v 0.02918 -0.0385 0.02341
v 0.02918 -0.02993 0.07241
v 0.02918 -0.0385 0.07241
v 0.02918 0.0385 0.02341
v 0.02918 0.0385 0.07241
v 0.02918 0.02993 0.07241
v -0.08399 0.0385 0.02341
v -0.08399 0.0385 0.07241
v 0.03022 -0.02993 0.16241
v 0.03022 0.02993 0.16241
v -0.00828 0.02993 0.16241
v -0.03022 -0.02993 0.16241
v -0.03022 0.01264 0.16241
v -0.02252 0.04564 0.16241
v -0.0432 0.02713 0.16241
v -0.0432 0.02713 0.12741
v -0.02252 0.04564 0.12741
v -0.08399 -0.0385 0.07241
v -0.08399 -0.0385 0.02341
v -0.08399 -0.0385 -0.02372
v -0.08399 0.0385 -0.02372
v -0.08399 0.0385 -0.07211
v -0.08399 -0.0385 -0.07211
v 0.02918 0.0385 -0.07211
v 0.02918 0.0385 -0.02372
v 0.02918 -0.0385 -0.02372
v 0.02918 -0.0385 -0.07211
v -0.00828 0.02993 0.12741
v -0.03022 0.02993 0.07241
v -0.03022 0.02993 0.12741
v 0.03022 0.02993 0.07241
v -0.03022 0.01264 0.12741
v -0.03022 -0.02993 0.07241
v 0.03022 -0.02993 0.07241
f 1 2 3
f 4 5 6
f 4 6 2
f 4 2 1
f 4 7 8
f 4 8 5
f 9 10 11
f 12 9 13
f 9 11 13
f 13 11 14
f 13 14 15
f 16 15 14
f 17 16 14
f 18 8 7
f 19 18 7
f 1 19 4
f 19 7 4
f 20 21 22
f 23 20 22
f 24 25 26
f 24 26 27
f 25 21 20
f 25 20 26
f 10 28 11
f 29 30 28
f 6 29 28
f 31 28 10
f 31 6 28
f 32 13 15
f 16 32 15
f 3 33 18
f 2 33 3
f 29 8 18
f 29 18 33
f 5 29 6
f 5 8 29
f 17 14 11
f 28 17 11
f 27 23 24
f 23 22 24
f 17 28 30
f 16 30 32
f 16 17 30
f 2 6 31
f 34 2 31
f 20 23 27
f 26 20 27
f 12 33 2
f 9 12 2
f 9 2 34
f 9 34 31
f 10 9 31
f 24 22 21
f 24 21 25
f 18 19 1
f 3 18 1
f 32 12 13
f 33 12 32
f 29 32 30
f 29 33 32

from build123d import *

# Parameters (mm, degrees)
SKETCH1_W             = 0.113177451
SKETCH1_H             = 0.048392057
BOSS_EXTRUDE1_DEPTH   = 0.0385
SKETCH1_H_2           = 0.04900298
BOSS_EXTRUDE1_2_DEPTH = 0.0385
SKETCH2_W             = 0.060435072
SKETCH2_H             = 0.059857316
BOSS_EXTRUDE2_DEPTH   = 0.09
BOSS_EXTRUDE3_DEPTH   = 0.035


with BuildPart() as part:
    # Sketch1 → Boss-Extrude1 (new body, symmetric)
    with BuildSketch(Plane(origin=(0, 0, 0), x_dir=(1, 0, 0), z_dir=(0, 1, 0))):
        with Locations((-0.027404412, 0.047911973)):
            Rectangle(SKETCH1_W, SKETCH1_H)
    extrude(amount=BOSS_EXTRUDE1_DEPTH, both=True)


with BuildPart() as body_2:
    # Sketch1 → Boss-Extrude1 2 (new body, symmetric)
    with BuildSketch(Plane(origin=(0, 0, 0), x_dir=(1, 0, 0), z_dir=(0, 1, 0))):
        with Locations((-0.027404412, -0.047911817)):
            Rectangle(SKETCH1_W, SKETCH1_H_2)
    extrude(amount=BOSS_EXTRUDE1_2_DEPTH, both=True)

    # Sketch2 → Boss-Extrude2 (add)
    with BuildSketch(Plane.XY.offset(0.072413307)):
        Rectangle(SKETCH2_W, SKETCH2_H)
    extrude(amount=BOSS_EXTRUDE2_DEPTH)

    # Sketch3 → Boss-Extrude3 (add)
    with BuildSketch(Plane.XY.offset(0.162413307)):
        Polygon((-0.030217536, 0.012636531), (-0.043195458, 0.027127409), (-0.022522092, 0.045642322), (-0.007890561, 0.029502338), align=None)
    extrude(amount=-BOSS_EXTRUDE3_DEPTH)


solid = Compound([part.part, body_2.part])
